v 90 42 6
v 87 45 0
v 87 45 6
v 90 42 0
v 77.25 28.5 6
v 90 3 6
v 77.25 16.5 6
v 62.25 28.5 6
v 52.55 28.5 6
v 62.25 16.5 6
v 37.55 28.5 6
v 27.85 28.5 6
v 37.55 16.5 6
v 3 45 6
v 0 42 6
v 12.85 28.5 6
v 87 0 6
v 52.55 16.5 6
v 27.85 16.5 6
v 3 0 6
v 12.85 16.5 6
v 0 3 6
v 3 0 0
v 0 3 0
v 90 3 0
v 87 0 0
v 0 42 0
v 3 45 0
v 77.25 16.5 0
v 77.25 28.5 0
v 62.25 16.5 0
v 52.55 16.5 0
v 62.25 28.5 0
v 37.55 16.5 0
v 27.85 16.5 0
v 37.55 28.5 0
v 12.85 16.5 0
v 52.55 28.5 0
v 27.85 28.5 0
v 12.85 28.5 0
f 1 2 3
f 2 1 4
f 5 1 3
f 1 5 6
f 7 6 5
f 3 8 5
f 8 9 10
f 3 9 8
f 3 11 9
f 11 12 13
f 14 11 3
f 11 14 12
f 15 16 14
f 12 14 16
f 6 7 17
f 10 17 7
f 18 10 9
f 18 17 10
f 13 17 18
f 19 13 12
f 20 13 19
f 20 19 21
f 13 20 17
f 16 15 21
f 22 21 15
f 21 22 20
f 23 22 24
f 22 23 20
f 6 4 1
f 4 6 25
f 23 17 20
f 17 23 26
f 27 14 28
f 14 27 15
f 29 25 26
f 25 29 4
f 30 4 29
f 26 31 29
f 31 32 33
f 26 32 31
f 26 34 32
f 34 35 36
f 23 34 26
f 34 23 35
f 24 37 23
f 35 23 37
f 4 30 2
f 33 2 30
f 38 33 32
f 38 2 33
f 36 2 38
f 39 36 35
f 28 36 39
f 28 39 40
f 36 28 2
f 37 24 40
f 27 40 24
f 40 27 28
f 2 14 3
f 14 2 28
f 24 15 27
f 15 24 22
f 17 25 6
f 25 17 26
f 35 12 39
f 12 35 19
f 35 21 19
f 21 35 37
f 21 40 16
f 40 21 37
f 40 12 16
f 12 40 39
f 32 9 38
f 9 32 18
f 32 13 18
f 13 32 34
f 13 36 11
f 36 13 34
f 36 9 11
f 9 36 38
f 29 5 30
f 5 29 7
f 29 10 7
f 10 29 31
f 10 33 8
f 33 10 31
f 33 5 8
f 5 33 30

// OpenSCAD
$fn = 32;

// ----------------------------------------------------------------------
// Windowed plate: 3 voids, 90 x 45 x 6 mm
// ----------------------------------------------------------------------

// --- parameters (mm) ---
plate_l = 90;             // plate length, X
plate_w = 45;             // plate width, Y
plate_t = 6;              // plate thickness, Z
edge_margin = 8;          // wall from the plate edge to any window
windows = 3;              // number of windows in the row
win_l = 15;               // window length
win_w = 12;               // window width
win_pitch = 24.7;         // window pitch along X
depth_1 = 6;              // depth of void 1 (full thickness = through)
depth_2 = 6;              // depth of void 2 (full thickness = through)
depth_3 = 6;              // depth of void 3 (full thickness = through)
corner_c = 3;             // corner chamfer of the plate

profile = [[3, 0], [87, 0], [90, 3], [90, 42], [87, 45], [3, 45], [0, 42], [0, 3]];  // primary outline, 8 points, counter clockwise
void_1 = [[12.85, 16.5], [27.85, 16.5], [27.85, 28.5], [12.85, 28.5]];  // window 1 of the row, 4 points
void_2 = [[37.55, 16.5], [52.55, 16.5], [52.55, 28.5], [37.55, 28.5]];  // window 2 of the row, 4 points
void_3 = [[62.25, 16.5], [77.25, 16.5], [77.25, 28.5], [62.25, 28.5]];  // window 3 of the row, 4 points

// --- the one profile operation ---
difference() {
  linear_extrude(height = plate_t) polygon(points = profile);
  translate([0, 0, -1])
    linear_extrude(height = plate_t + 2) polygon(points = void_1);
  translate([0, 0, -1])
    linear_extrude(height = plate_t + 2) polygon(points = void_2);
  translate([0, 0, -1])
    linear_extrude(height = plate_t + 2) polygon(points = void_3);
}
